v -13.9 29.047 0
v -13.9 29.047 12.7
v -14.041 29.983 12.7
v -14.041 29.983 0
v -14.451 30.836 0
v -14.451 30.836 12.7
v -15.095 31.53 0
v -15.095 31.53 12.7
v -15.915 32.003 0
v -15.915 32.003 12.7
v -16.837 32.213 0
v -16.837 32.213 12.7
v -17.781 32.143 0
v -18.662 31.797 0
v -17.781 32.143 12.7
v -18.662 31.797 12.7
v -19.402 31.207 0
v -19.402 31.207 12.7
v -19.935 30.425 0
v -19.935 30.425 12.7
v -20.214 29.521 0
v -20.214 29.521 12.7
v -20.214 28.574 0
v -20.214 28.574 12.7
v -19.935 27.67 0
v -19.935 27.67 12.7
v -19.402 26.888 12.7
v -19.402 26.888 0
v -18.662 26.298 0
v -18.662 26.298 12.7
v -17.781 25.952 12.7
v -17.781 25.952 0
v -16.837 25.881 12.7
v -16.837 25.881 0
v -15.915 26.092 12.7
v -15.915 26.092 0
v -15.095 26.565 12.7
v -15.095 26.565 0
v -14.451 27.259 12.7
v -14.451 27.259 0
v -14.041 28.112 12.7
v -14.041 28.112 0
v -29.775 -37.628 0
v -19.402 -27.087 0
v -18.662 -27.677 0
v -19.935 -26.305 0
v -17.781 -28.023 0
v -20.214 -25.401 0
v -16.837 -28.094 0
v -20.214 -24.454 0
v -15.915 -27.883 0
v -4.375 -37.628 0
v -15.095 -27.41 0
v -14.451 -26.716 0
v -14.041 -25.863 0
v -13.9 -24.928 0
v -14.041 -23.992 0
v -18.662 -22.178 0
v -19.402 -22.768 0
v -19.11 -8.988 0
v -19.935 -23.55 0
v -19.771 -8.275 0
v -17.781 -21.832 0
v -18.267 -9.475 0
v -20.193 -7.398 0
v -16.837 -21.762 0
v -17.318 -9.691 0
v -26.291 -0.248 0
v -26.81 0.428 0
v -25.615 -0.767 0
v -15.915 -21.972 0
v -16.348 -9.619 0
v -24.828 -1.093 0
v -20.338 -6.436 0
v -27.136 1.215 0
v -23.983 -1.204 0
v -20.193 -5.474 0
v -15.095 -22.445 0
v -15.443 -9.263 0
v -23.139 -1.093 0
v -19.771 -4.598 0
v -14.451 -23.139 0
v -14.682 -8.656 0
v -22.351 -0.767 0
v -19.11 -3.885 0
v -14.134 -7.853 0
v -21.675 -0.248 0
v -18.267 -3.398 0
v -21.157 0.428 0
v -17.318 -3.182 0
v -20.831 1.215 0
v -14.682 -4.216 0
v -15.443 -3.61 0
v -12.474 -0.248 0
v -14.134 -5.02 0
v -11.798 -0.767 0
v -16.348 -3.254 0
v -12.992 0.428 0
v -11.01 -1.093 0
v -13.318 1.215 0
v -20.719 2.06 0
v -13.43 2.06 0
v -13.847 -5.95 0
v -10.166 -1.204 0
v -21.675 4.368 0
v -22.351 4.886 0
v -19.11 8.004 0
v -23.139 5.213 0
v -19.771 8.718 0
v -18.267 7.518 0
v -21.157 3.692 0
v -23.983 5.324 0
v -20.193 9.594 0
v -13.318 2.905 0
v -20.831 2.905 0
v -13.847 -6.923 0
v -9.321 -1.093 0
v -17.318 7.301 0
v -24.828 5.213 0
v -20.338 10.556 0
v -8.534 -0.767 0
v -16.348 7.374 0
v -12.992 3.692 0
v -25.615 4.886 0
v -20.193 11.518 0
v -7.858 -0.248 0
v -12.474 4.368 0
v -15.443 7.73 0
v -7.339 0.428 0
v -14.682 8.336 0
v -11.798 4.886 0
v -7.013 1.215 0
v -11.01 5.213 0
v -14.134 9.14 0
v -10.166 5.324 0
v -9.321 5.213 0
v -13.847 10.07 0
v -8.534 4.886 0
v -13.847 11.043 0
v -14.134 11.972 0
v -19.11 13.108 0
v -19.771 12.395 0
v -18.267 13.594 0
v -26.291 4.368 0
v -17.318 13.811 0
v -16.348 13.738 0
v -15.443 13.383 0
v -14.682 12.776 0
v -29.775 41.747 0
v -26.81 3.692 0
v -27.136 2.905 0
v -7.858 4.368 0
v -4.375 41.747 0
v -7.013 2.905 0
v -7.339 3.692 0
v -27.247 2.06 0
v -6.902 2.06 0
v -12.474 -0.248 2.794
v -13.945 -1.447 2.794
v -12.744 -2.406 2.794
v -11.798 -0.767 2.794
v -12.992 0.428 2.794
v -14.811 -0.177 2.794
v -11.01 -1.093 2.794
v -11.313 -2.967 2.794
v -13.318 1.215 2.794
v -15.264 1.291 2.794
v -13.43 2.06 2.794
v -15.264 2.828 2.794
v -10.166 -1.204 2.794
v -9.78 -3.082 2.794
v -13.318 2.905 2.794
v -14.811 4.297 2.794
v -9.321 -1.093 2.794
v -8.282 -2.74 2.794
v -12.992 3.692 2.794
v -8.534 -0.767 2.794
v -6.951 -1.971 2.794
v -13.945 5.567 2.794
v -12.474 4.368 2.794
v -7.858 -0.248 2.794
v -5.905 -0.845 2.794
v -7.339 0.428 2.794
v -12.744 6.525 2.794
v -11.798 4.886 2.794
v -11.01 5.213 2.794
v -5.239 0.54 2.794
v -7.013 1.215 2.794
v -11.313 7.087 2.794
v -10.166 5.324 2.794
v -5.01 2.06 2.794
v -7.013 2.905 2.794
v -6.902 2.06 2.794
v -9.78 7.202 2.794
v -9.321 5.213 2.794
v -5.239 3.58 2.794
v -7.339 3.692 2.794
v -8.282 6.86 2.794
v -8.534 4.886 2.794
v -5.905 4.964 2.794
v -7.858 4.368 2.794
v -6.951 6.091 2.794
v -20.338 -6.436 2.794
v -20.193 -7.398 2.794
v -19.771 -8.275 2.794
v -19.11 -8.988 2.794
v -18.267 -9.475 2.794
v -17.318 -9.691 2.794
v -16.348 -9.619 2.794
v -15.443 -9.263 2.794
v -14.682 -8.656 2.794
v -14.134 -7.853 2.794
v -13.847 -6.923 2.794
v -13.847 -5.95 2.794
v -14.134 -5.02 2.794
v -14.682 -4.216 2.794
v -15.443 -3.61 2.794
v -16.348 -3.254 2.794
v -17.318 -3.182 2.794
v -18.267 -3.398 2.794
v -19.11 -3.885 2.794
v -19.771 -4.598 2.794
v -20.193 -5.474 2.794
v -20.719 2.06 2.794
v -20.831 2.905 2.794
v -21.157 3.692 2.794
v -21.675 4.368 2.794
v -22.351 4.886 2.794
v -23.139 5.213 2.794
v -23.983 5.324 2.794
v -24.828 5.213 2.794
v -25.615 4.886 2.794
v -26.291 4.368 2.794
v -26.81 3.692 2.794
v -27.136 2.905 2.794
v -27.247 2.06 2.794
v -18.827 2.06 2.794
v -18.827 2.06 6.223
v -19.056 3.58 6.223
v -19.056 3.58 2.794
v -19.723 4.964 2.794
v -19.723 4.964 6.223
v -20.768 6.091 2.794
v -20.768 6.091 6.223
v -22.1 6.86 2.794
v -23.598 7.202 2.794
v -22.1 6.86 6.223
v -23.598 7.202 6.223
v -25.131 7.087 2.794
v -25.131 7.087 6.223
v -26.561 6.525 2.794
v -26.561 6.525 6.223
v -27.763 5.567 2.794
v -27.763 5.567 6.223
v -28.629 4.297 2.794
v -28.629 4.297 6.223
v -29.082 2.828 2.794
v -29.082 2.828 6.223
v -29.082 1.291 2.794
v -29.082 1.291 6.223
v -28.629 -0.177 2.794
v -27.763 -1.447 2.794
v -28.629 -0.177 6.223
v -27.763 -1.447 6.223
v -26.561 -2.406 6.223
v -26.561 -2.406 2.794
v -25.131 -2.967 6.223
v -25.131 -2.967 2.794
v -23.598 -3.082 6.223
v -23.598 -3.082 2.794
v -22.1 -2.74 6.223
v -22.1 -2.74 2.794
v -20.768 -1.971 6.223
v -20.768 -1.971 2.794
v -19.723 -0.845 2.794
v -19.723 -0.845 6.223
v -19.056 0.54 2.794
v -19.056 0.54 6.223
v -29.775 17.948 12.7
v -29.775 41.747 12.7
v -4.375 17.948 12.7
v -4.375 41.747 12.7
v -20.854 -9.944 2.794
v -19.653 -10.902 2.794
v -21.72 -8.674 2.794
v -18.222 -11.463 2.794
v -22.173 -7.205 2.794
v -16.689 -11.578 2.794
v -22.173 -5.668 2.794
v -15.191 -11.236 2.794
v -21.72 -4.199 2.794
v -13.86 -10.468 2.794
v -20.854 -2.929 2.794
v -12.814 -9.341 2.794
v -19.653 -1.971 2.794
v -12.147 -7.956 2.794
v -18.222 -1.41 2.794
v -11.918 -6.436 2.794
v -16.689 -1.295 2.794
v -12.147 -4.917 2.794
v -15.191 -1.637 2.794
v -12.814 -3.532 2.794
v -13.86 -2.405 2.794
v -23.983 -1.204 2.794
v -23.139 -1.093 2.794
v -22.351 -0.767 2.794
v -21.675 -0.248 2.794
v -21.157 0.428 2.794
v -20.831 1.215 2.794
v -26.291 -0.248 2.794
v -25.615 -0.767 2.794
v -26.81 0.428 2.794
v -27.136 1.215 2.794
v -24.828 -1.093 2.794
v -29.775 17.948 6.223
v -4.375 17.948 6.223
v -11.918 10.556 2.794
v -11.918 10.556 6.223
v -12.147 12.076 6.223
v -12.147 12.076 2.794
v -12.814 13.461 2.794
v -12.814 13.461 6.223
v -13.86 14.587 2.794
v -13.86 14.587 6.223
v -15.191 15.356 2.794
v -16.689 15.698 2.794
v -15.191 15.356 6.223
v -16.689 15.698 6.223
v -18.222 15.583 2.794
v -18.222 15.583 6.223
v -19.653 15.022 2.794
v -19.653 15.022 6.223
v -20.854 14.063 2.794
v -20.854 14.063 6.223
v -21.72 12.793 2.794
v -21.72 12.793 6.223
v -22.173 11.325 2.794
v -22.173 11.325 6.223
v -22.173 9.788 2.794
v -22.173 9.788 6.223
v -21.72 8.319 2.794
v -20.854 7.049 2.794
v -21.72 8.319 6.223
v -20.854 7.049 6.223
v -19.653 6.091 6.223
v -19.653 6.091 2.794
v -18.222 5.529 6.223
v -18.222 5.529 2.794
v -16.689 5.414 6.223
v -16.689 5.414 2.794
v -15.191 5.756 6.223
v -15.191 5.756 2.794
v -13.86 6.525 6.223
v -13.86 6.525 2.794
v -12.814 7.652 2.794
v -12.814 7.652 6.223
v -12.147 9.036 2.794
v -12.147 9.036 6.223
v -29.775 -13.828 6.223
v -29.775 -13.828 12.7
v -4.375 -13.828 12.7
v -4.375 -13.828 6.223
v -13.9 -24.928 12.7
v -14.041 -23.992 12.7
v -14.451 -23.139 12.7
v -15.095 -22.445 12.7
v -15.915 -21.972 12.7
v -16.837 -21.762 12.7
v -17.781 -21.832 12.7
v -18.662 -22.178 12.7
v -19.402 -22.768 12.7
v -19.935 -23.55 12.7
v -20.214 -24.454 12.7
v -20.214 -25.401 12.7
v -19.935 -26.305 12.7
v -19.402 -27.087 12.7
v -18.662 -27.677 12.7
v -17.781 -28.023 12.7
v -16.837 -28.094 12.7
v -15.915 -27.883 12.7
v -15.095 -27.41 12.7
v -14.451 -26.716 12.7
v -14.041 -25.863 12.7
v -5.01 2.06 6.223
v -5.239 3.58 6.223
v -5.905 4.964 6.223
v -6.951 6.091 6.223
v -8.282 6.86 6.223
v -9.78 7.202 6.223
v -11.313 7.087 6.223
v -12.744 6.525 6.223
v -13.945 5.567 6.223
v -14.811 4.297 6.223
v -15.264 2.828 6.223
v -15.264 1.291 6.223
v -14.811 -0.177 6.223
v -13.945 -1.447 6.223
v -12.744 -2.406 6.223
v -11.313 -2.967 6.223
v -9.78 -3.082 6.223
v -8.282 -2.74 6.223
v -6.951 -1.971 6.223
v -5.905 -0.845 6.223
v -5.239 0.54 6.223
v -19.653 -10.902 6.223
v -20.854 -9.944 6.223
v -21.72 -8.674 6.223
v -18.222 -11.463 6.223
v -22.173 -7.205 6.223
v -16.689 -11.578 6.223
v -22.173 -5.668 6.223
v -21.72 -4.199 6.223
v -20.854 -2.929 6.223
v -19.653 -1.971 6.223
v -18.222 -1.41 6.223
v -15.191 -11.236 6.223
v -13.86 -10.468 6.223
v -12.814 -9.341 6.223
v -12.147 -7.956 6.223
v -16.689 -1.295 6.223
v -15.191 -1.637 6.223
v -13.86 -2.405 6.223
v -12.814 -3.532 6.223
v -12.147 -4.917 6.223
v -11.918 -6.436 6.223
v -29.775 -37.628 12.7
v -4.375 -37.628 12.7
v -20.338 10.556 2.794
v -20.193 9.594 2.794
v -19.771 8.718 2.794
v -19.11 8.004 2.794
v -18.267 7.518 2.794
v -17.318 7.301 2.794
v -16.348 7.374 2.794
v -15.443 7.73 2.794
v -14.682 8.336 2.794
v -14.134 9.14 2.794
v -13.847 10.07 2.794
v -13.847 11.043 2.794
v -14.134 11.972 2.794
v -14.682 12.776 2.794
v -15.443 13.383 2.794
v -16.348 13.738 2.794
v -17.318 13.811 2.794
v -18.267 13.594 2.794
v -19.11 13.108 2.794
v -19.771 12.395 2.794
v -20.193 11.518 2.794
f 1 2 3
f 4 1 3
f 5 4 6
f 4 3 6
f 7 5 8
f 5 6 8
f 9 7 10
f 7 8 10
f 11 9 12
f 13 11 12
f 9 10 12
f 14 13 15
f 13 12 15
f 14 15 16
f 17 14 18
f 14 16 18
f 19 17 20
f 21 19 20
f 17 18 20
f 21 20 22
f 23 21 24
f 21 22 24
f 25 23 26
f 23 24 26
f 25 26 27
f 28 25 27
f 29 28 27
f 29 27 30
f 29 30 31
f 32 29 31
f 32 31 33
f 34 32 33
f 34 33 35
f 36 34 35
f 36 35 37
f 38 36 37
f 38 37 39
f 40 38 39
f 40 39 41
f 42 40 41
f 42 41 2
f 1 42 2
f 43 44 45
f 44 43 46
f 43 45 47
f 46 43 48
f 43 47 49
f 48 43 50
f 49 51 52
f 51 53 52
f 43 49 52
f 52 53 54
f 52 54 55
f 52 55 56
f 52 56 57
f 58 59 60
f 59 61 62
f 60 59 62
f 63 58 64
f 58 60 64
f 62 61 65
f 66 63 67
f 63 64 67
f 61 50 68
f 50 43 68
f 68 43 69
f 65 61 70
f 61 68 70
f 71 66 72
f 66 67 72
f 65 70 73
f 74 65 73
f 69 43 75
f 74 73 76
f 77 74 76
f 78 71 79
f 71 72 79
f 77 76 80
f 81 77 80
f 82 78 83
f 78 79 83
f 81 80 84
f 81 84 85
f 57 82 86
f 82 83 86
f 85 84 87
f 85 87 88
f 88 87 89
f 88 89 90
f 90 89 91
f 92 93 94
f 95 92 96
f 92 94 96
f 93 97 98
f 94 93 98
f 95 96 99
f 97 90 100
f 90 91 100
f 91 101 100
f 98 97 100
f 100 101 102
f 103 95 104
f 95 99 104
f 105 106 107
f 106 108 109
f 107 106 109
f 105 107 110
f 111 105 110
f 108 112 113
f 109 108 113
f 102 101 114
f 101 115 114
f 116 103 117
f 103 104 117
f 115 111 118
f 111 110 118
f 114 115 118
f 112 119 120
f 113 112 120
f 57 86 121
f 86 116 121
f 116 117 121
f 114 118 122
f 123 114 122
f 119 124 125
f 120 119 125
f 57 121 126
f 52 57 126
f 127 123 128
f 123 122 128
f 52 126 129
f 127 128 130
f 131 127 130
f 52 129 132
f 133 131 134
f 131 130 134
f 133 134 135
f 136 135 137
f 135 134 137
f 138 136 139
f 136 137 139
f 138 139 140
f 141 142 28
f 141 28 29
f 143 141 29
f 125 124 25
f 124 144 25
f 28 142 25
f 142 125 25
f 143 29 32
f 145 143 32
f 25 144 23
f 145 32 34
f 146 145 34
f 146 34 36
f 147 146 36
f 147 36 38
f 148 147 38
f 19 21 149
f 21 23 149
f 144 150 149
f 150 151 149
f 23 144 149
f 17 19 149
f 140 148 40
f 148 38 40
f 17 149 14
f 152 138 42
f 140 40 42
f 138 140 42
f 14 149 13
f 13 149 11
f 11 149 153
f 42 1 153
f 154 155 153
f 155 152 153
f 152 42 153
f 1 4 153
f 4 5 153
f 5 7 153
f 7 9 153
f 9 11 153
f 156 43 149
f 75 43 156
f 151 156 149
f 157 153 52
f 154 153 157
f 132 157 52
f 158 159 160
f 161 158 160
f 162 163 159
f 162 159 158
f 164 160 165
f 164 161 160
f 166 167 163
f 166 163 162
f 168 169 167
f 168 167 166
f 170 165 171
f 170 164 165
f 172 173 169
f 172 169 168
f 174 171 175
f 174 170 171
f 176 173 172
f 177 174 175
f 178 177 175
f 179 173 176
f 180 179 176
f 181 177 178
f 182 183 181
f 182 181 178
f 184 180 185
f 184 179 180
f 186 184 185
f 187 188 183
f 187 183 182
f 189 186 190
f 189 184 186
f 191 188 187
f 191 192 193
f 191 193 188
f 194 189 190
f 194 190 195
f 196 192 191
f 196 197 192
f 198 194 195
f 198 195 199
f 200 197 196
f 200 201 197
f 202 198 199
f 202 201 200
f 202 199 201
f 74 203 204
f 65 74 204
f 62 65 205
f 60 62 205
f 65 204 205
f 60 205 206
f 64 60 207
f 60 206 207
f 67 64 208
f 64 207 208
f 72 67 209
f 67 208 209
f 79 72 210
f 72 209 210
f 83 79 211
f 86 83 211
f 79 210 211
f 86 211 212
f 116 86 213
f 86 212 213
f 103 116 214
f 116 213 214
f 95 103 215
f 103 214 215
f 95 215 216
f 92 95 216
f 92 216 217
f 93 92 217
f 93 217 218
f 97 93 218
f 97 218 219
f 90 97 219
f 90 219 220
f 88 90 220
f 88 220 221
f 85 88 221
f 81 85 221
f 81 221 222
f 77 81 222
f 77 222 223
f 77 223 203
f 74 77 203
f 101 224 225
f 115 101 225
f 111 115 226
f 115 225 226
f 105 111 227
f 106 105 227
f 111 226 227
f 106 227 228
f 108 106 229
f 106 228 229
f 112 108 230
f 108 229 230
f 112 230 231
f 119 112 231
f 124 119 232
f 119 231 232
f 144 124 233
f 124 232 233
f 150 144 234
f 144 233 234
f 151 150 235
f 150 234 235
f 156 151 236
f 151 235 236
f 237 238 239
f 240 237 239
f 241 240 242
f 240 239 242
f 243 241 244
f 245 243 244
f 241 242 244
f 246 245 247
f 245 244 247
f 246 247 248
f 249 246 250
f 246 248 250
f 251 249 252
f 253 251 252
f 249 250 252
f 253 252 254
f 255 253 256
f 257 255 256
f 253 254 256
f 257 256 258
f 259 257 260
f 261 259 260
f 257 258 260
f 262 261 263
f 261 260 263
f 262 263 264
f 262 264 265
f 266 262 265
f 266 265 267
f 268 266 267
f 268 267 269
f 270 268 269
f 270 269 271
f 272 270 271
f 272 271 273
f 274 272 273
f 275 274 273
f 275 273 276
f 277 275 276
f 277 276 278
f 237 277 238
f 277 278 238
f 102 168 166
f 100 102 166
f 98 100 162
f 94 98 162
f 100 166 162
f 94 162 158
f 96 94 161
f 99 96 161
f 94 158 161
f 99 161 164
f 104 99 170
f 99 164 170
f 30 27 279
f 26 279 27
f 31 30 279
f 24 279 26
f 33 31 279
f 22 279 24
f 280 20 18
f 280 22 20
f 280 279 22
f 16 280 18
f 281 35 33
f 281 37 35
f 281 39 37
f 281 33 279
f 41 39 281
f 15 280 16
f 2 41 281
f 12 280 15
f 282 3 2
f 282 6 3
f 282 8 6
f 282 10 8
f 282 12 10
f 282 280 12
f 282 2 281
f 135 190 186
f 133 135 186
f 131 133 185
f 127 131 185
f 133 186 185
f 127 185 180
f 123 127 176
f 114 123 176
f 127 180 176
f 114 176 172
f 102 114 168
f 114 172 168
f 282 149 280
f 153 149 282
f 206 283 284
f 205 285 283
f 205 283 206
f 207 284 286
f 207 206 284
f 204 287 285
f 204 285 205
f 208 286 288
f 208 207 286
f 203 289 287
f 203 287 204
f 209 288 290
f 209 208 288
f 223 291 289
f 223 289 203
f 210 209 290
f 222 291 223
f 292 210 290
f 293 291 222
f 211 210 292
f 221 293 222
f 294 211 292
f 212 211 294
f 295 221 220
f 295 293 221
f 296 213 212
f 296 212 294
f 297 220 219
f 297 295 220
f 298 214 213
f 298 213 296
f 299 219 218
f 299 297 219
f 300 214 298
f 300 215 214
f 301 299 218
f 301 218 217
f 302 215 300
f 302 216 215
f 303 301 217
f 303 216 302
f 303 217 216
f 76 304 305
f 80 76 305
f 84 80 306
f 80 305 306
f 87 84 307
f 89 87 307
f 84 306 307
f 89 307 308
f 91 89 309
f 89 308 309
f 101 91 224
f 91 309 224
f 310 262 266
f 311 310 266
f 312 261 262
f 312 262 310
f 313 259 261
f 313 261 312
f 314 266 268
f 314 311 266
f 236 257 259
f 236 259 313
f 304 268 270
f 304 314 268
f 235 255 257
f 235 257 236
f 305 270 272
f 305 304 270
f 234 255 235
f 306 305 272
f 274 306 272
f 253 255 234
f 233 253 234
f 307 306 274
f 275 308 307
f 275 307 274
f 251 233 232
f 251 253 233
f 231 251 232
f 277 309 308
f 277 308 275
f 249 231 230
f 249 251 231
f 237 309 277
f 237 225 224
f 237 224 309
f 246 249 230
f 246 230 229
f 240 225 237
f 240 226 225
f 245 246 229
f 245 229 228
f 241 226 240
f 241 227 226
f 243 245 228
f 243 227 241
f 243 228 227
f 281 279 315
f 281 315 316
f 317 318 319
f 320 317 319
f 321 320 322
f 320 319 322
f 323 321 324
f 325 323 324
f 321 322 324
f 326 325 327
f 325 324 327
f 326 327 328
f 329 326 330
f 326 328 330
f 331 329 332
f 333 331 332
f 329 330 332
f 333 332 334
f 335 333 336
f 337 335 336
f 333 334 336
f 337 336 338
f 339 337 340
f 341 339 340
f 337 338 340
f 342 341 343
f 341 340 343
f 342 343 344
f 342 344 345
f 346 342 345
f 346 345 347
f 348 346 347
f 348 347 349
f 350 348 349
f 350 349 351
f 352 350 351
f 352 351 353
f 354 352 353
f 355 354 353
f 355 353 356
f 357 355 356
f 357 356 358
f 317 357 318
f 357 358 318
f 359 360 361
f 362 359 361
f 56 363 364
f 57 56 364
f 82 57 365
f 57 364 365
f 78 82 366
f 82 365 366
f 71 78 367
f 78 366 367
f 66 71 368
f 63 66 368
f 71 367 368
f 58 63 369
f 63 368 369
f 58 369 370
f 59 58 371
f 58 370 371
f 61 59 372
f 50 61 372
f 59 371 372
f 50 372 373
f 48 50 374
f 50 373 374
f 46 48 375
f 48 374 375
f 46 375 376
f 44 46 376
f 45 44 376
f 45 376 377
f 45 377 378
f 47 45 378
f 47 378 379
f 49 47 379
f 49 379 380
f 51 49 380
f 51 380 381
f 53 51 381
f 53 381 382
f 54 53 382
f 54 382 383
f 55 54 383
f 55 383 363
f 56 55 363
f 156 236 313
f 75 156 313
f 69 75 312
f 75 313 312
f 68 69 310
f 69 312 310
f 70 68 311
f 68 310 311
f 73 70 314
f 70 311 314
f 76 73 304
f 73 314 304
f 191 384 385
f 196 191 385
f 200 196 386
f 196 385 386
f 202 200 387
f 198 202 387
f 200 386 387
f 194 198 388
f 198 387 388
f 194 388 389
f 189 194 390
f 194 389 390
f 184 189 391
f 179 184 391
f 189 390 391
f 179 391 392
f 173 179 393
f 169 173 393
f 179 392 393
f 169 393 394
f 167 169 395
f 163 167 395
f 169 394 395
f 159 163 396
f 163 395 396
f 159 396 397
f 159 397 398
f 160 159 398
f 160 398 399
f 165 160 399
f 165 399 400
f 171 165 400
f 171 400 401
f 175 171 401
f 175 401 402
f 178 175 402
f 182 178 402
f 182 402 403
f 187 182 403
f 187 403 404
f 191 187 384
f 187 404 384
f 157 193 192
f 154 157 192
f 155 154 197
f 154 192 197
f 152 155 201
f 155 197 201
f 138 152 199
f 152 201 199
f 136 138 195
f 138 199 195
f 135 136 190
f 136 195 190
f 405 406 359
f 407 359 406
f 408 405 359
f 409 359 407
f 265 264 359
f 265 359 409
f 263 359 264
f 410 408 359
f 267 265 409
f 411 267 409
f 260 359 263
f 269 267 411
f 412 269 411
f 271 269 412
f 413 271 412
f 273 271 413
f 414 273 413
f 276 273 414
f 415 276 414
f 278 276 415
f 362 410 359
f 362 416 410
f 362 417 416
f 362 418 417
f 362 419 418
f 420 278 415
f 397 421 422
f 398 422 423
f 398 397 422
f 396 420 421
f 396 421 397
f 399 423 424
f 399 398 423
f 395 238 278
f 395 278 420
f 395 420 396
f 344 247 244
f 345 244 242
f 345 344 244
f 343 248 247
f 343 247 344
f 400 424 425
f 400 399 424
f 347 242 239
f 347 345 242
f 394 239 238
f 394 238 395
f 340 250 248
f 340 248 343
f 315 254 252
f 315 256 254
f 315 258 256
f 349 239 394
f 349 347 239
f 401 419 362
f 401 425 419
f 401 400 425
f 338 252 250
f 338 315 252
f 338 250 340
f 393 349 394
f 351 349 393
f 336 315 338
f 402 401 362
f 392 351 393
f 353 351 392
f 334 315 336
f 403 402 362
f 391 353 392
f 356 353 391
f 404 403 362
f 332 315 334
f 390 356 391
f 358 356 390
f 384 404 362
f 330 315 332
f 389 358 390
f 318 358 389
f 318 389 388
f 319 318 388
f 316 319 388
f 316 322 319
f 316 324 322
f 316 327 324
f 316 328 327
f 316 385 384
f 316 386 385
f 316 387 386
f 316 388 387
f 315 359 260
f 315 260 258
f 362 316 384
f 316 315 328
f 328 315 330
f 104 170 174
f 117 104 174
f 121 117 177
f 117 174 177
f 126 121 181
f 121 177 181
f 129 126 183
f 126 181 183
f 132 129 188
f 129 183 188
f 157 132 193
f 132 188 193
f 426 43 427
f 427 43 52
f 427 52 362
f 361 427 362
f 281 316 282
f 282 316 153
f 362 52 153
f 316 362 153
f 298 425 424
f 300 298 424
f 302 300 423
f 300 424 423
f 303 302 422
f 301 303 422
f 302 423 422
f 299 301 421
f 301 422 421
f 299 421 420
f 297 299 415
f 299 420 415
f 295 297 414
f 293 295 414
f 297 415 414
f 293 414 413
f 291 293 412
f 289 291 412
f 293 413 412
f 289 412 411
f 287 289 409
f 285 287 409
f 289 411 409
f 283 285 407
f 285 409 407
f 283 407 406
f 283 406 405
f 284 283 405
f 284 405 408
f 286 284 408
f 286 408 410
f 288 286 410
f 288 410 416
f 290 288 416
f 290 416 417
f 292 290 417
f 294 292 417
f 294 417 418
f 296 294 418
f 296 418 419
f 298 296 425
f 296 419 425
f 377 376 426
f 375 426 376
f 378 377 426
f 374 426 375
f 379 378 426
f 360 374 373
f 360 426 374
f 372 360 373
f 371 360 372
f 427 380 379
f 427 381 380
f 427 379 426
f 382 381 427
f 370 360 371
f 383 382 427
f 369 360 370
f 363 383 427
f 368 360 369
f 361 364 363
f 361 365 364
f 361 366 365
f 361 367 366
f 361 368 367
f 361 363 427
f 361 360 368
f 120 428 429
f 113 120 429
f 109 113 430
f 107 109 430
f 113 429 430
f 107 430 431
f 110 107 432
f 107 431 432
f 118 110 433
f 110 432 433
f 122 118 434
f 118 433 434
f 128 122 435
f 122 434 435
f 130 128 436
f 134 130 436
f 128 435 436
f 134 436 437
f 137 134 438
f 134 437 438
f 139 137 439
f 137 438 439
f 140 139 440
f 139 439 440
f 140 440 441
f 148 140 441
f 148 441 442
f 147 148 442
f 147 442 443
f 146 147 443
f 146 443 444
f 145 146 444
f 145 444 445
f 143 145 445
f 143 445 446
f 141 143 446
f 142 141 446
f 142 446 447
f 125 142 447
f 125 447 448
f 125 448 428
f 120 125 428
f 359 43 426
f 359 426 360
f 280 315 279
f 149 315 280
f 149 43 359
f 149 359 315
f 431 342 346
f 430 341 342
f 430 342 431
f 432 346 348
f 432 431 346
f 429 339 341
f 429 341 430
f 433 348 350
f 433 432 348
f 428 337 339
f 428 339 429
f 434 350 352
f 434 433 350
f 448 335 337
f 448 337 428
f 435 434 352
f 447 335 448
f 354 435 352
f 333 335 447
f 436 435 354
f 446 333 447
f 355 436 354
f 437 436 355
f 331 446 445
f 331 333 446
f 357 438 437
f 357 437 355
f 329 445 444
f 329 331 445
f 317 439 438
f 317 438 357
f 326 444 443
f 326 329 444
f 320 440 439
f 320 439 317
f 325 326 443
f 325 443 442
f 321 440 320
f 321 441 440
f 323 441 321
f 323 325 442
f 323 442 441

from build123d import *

# Parameters (mm, degrees)
SKETCH1_W          = 25.4
SKETCH1_H          = 79.375
EXTRUDE1_DEPTH     = 12.7
SKETCH2_W          = 25.4
SKETCH2_H          = 31.7754
CUT_EXTRUDE1_DEPTH = 6.477
SKETCH3_R          = 3.175
CUT_EXTRUDE2_DEPTH = 13.7
SKETCH4_R          = 5.1562
CUT_EXTRUDE3_DEPTH = 3.429


with BuildPart() as part:
    # Sketch1 → Extrude1 (new body)
    with BuildSketch(Plane.XY):
        with Locations((-17.074536082, 2.059865407)):
            Rectangle(SKETCH1_W, SKETCH1_H)
    extrude(amount=EXTRUDE1_DEPTH)

    # Sketch2 → Cut-Extrude1 (cut)
    with BuildSketch(Plane.XY.offset(12.7)):
        with Locations((-17.074536082, 2.059865407)):
            Rectangle(SKETCH2_W, SKETCH2_H)
    extrude(amount=-CUT_EXTRUDE1_DEPTH, mode=Mode.SUBTRACT)

    # Sketch3 → Cut-Extrude2 (cut, through all)
    with BuildSketch(Plane.XY.offset(12.7)):
        with BuildLine():
            ThreePointArc((-13.810636082, 10.556165407), (-17.074536082, 13.820065407), (-20.338436082, 10.556165407))
            Line((-20.338436082, 10.556165407), (-13.810636082, 10.556165407))
        make_face()
        with BuildLine():
            Line((-13.810636082, 10.556165407), (-20.338436082, 10.556165407))
            ThreePointArc((-20.338436082, 10.556165407), (-17.074536082, 7.292265407), (-13.810636082, 10.556165407))
        make_face()
        with BuildLine():
            ThreePointArc((-23.983336082, 5.323765407), (-26.291261906, 4.36779123), (-27.247236082, 2.059865407))
            Line((-27.247236082, 2.059865407), (-23.983336082, 2.059865407))
            Line((-23.983336082, 2.059865407), (-23.983336082, 5.323765407))
        make_face()
        with BuildLine():
            Line((-23.983336082, 2.059865407), (-27.247236082, 2.059865407))
            ThreePointArc((-27.247236082, 2.059865407), (-26.291261906, -0.248060416), (-23.983336082, -1.204034593))
            Line((-23.983336082, -1.204034593), (-23.983336082, 2.059865407))
        make_face()
        with BuildLine():
            Line((-23.983336082, 5.323765407), (-23.983336082, 2.059865407))
            Line((-23.983336082, 2.059865407), (-20.719436082, 2.059865407))
            ThreePointArc((-20.719436082, 2.059865407), (-21.675410259, 4.36779123), (-23.983336082, 5.323765407))
        make_face()
        with BuildLine():
            Line((-20.719436082, 2.059865407), (-23.983336082, 2.059865407))
            Line((-23.983336082, 2.059865407), (-23.983336082, -1.204034593))
            ThreePointArc((-23.983336082, -1.204034593), (-21.675410259, -0.248060416), (-20.719436082, 2.059865407))
        make_face()
        with BuildLine():
            ThreePointArc((-10.165736082, 5.323765407), (-12.473661906, 4.36779123), (-13.429636082, 2.059865407))
            Line((-13.429636082, 2.059865407), (-10.165736082, 2.059865407))
            Line((-10.165736082, 2.059865407), (-10.165736082, 5.323765407))
        make_face()
        with BuildLine():
            Line((-10.165736082, 2.059865407), (-13.429636082, 2.059865407))
            ThreePointArc((-13.429636082, 2.059865407), (-12.473661906, -0.248060416), (-10.165736082, -1.204034593))
            Line((-10.165736082, -1.204034593), (-10.165736082, 2.059865407))
        make_face()
        with BuildLine():
            Line((-10.165736082, 5.323765407), (-10.165736082, 2.059865407))
            Line((-10.165736082, 2.059865407), (-6.901836082, 2.059865407))
            ThreePointArc((-6.901836082, 2.059865407), (-7.857810259, 4.36779123), (-10.165736082, 5.323765407))
        make_face()
        with BuildLine():
            Line((-6.901836082, 2.059865407), (-10.165736082, 2.059865407))
            Line((-10.165736082, 2.059865407), (-10.165736082, -1.204034593))
            ThreePointArc((-10.165736082, -1.204034593), (-7.857810259, -0.248060416), (-6.901836082, 2.059865407))
        make_face()
        with BuildLine():
            ThreePointArc((-13.810636082, -6.436434593), (-17.074536082, -3.172534593), (-20.338436082, -6.436434593))
            Line((-20.338436082, -6.436434593), (-13.810636082, -6.436434593))
        make_face()
        with BuildLine():
            Line((-13.810636082, -6.436434593), (-20.338436082, -6.436434593))
            ThreePointArc((-20.338436082, -6.436434593), (-17.074536082, -9.700334593), (-13.810636082, -6.436434593))
        make_face()
        with Locations((-17.074536082, -24.927634593)):
            Circle(SKETCH3_R)
        with Locations((-17.074536082, 29.047365407)):
            Circle(SKETCH3_R)
    extrude(amount=-CUT_EXTRUDE2_DEPTH, mode=Mode.SUBTRACT)

    # Sketch4 → Cut-Extrude3 (cut)
    with BuildSketch(Plane.XY.offset(6.223)):
        with Locations((-17.074536082, 10.556165407)):
            Circle(SKETCH4_R)
        with Locations((-10.165736082, 2.059865407)):
            Circle(SKETCH4_R)
        with Locations((-17.074536082, -6.436434593)):
            Circle(SKETCH4_R)
        with Locations((-23.983336082, 2.059865407)):
            Circle(SKETCH4_R)
    extrude(amount=-CUT_EXTRUDE3_DEPTH, mode=Mode.SUBTRACT)


solid = part.part
